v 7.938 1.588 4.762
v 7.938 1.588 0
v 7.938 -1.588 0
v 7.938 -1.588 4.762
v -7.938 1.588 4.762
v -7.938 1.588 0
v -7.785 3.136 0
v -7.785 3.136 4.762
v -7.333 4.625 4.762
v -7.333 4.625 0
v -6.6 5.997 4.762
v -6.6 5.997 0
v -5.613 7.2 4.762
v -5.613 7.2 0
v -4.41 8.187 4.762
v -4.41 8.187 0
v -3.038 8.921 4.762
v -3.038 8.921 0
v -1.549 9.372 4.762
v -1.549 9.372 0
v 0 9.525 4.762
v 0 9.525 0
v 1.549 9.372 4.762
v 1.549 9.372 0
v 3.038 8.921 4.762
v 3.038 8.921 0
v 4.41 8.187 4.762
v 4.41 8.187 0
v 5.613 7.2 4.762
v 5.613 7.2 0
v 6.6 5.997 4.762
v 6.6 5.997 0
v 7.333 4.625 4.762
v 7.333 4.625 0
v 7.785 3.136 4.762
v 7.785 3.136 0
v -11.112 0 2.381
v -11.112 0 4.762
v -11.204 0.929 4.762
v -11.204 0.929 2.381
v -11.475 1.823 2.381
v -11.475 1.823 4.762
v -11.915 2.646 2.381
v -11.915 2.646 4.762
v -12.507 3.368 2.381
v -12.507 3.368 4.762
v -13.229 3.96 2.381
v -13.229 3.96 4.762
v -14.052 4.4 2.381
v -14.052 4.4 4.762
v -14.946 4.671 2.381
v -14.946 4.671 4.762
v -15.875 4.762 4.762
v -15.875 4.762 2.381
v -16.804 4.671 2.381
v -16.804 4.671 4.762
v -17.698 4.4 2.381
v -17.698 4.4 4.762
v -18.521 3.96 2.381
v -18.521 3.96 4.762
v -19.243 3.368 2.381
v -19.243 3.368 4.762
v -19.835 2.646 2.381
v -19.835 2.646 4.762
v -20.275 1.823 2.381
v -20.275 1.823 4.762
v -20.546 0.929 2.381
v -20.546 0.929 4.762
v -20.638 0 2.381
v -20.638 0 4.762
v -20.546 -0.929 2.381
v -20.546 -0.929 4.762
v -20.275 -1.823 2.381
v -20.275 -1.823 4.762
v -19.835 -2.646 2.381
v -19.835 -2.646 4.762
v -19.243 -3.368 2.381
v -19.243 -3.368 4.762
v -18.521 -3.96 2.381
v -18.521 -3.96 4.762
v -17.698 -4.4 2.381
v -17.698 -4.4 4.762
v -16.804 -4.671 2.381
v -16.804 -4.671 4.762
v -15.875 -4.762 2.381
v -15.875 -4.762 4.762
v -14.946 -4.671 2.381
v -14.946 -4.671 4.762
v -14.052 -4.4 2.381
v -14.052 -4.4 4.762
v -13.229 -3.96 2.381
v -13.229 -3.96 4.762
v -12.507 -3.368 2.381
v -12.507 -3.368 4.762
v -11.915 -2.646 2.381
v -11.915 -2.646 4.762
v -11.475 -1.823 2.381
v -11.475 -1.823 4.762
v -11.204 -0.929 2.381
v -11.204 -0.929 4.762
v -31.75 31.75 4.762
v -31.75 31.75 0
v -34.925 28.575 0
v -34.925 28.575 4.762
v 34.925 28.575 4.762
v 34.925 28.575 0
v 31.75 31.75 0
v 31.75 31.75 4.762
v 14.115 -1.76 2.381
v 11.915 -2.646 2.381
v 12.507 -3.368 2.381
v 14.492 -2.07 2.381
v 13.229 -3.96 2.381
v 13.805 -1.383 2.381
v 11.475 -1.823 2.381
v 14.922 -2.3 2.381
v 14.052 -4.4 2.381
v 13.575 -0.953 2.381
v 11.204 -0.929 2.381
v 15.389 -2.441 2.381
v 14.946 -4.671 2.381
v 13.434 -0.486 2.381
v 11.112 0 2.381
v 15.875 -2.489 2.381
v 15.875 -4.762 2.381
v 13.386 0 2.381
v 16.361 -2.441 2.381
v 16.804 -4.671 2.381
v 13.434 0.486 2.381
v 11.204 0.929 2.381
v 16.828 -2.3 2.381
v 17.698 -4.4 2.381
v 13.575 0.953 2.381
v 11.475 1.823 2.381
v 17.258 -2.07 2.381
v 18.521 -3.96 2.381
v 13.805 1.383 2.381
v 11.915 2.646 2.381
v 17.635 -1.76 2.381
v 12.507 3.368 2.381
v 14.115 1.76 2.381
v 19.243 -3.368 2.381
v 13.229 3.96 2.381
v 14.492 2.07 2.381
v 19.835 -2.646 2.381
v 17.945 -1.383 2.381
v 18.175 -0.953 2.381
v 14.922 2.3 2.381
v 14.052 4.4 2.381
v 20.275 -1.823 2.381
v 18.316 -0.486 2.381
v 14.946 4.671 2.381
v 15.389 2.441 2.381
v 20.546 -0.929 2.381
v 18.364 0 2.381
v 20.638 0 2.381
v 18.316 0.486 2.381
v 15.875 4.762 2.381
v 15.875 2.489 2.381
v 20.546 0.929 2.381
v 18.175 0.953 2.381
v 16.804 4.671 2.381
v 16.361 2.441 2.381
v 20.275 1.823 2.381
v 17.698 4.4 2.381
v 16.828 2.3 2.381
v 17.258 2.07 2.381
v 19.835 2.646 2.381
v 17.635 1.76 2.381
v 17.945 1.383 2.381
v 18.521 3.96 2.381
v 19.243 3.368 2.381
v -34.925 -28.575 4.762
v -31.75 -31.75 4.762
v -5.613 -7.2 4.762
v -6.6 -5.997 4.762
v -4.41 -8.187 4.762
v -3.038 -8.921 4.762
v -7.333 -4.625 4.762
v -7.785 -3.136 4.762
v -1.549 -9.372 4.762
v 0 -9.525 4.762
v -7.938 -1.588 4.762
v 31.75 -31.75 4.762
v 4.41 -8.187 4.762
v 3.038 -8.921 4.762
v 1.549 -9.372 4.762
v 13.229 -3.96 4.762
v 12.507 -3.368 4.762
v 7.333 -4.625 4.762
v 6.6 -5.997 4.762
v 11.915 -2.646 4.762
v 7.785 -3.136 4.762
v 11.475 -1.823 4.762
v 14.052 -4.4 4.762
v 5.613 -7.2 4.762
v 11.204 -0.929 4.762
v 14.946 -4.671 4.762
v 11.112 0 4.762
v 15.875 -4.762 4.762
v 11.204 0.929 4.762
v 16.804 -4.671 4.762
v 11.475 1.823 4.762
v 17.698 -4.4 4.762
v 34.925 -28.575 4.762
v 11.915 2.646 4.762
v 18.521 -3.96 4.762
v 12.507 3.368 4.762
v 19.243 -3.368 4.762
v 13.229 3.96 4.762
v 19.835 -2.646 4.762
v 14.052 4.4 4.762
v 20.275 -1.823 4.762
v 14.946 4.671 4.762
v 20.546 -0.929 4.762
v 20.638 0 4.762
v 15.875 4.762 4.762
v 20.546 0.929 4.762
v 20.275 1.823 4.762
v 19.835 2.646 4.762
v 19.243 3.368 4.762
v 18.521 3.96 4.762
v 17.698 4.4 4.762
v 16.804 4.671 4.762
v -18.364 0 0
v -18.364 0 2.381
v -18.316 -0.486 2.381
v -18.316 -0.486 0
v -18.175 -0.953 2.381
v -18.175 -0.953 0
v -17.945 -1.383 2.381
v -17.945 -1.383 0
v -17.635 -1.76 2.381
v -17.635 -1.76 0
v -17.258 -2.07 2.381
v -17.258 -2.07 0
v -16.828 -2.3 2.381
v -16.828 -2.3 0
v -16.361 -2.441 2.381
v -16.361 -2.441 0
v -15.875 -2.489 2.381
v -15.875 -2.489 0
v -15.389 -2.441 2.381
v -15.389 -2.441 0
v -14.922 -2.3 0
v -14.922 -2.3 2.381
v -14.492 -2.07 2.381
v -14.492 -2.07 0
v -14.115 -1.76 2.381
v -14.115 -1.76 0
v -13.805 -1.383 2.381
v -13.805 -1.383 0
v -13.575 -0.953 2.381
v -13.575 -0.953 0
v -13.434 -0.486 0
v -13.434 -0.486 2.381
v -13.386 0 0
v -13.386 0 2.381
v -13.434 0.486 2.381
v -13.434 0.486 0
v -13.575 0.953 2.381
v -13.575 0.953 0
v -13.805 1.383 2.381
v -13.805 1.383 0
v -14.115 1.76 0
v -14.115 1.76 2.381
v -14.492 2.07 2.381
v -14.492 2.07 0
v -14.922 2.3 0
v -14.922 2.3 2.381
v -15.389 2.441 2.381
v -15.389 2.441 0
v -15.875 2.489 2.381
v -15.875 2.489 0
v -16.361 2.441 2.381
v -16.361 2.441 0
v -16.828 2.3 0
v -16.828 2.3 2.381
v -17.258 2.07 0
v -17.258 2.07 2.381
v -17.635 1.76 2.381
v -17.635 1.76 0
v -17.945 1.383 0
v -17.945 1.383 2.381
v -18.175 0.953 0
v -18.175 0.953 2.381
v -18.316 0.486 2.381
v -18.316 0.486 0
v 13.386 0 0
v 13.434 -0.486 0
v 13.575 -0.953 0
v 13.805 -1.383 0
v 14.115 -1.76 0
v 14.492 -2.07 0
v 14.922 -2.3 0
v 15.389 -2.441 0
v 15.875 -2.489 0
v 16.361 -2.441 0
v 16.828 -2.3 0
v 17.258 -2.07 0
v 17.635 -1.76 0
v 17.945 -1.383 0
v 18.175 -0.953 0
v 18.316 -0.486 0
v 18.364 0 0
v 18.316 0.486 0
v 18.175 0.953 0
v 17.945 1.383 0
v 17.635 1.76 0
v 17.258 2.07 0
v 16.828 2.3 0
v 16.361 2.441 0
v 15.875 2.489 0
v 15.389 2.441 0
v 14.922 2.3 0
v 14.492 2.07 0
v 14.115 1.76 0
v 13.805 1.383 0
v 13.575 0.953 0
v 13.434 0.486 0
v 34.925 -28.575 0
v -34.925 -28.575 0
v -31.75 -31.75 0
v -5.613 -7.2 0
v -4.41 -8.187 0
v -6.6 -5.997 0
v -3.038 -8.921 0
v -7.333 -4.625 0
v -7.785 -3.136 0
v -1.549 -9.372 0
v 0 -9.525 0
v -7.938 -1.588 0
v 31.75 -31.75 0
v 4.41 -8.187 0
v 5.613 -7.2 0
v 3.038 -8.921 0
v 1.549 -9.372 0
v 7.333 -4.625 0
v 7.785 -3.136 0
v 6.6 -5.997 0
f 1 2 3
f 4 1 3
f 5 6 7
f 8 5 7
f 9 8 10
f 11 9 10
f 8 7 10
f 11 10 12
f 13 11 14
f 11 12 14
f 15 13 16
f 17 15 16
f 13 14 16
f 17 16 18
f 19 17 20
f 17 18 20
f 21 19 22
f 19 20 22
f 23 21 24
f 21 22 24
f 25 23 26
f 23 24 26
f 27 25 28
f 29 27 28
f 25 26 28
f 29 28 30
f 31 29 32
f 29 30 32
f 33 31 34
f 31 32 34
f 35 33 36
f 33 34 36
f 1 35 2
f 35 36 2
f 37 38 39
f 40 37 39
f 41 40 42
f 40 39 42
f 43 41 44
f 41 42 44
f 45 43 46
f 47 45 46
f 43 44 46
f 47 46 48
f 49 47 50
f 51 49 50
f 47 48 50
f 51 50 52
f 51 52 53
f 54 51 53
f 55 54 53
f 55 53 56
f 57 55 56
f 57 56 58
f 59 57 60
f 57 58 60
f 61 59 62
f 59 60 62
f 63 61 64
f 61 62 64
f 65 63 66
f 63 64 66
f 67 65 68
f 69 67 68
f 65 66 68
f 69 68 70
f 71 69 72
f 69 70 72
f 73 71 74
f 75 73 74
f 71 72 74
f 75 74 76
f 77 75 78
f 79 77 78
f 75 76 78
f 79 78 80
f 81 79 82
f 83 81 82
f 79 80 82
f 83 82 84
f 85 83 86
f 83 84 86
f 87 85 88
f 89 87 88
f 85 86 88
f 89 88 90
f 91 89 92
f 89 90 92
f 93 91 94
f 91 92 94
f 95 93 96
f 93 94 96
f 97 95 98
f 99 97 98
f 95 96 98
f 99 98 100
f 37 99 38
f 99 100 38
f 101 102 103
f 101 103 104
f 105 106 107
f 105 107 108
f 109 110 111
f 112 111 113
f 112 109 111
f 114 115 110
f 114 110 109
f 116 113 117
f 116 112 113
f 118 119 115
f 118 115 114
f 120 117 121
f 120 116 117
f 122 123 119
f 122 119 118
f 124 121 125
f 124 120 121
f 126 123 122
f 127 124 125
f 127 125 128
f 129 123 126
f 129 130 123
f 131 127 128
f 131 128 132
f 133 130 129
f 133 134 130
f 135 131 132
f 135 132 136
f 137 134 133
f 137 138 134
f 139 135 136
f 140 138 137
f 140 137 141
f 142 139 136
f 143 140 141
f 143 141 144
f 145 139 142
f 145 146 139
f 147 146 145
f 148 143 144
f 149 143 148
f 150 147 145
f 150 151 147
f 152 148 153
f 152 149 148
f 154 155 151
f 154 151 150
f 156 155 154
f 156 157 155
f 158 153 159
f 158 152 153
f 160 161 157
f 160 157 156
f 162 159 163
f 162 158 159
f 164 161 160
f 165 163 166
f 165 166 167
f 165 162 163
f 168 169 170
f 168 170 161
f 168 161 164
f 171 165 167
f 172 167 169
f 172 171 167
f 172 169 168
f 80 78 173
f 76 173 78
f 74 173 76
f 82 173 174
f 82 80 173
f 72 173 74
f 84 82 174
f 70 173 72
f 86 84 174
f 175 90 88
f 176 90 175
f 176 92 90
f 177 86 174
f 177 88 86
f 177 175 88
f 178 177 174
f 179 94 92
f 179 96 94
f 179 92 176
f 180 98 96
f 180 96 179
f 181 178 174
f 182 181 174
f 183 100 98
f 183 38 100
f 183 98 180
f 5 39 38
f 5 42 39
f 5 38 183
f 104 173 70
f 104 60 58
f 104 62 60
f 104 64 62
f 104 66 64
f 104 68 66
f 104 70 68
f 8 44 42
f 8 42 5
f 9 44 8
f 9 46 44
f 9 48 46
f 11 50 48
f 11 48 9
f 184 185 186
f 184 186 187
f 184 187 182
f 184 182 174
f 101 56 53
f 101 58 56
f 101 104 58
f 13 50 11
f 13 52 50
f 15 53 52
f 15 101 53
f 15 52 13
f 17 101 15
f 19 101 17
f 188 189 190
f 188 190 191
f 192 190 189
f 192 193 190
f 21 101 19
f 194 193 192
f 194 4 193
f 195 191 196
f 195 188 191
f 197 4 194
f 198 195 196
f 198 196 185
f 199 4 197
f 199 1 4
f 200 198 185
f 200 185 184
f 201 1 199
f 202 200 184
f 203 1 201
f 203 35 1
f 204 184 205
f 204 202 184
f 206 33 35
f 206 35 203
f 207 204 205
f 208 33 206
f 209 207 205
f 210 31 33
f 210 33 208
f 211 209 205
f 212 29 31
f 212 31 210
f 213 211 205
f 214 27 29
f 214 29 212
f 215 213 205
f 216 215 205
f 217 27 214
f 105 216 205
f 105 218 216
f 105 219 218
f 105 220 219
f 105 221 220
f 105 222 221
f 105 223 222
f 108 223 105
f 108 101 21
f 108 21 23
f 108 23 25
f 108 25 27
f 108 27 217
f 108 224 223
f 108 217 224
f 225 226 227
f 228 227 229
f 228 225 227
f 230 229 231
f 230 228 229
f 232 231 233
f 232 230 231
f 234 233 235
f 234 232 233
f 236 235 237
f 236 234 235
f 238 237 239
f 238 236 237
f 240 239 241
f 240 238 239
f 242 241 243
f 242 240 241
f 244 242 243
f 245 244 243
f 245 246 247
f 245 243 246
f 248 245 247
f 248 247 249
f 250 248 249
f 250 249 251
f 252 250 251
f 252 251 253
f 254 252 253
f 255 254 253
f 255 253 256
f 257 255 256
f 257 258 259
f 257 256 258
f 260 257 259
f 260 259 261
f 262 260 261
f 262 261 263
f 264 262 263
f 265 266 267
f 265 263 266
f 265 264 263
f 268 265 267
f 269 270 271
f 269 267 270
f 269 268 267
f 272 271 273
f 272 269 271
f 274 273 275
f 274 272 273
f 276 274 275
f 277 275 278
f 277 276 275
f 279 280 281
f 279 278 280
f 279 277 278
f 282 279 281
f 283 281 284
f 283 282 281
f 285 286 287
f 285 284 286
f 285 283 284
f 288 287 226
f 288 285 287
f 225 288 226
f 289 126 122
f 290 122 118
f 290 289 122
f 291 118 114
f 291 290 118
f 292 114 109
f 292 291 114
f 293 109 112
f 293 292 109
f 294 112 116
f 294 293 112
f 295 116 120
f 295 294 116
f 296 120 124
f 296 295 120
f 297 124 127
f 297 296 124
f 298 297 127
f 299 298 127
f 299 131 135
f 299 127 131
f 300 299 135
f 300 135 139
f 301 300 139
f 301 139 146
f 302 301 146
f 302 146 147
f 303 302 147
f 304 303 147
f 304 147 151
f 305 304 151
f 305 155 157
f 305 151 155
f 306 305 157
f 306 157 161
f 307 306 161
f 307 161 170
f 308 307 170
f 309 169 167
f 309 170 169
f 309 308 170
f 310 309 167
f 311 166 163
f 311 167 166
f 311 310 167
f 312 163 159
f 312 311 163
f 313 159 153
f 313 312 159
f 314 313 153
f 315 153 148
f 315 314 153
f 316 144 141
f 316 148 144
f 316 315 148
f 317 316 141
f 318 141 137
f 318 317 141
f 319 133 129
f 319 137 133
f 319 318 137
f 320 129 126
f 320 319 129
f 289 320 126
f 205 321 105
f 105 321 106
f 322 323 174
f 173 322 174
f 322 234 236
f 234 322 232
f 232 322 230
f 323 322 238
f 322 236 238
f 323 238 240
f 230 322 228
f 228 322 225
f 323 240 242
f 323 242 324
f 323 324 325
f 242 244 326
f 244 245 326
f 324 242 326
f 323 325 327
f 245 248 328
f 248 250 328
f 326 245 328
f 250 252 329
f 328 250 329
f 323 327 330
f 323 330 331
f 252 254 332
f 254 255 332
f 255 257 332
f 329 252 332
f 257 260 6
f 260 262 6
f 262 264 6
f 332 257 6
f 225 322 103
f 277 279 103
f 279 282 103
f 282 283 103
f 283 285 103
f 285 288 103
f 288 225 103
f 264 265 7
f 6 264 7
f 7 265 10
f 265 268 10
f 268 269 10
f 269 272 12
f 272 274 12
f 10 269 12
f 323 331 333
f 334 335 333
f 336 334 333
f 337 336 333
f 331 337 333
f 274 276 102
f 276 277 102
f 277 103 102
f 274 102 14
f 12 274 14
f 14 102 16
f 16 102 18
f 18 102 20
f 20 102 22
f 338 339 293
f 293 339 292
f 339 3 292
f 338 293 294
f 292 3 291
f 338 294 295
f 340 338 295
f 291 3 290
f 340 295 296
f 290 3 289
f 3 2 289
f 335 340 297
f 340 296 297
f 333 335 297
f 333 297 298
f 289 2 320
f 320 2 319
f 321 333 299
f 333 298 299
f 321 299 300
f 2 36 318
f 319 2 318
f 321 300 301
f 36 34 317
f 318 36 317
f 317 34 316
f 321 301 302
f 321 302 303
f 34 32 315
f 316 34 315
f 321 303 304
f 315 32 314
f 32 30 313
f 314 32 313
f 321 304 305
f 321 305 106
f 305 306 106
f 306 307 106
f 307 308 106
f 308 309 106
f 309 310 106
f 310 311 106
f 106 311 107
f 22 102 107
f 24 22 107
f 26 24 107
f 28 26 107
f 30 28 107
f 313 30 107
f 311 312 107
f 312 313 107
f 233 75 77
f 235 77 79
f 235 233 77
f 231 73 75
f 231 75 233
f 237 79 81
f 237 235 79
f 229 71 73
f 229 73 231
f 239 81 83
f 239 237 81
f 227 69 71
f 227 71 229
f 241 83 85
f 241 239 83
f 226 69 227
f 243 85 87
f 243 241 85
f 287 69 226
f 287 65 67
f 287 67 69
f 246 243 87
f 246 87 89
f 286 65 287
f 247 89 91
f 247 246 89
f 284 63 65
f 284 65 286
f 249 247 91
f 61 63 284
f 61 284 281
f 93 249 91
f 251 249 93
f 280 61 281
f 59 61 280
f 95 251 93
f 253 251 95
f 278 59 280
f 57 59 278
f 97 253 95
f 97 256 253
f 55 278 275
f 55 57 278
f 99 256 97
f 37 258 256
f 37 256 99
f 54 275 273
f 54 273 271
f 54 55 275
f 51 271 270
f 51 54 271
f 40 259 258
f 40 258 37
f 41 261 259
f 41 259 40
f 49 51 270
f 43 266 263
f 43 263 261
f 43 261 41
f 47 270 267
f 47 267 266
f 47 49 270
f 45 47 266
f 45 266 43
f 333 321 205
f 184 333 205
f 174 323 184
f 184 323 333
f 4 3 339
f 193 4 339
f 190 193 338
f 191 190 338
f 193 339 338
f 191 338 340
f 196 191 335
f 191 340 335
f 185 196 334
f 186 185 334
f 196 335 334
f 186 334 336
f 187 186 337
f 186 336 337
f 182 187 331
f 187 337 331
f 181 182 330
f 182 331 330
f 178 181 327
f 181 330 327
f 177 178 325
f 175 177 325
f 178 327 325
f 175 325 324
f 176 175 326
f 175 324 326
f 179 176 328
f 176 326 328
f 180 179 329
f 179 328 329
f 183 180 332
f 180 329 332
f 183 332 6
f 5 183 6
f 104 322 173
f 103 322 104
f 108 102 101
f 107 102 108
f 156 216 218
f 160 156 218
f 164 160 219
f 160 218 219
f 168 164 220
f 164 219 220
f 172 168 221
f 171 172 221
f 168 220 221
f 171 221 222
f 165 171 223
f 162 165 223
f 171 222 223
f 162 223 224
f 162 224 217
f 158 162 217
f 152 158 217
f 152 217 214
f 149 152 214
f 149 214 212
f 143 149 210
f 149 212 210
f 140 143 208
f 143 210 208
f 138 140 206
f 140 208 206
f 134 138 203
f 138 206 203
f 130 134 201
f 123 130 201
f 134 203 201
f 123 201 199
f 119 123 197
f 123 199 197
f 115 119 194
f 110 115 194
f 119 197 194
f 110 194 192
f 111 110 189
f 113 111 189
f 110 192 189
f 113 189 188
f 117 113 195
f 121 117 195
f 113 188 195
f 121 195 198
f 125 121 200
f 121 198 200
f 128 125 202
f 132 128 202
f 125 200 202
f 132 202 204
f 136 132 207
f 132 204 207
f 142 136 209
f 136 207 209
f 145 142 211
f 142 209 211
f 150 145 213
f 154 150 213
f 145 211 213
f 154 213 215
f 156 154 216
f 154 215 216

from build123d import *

# Parameters (mm, degrees)
SKETCH1_W           = 69.85
SKETCH1_H           = 63.5
SKETCH1_R           = 2.4892
BOSS_EXTRUDE1_DEPTH = 4.7625
CHAMFER1_SIZE       = 3.175
SKETCH2_R           = 4.7625
CUT_EXTRUDE1_DEPTH  = 2.38125


with BuildPart() as part:
    # Sketch1 → Boss-Extrude1 (new body)
    with BuildSketch(Plane.XY):
        Rectangle(SKETCH1_W, SKETCH1_H)
        with Locations(Location((-15.875, 0, 0), (0, 0, 180))):
            Circle(SKETCH1_R, mode=Mode.SUBTRACT)
        with Locations(Location((15.875, 0, 0), (0, 0, 180))):
            Circle(SKETCH1_R, mode=Mode.SUBTRACT)
        with BuildLine():
            Line((7.9375, 1.5875), (7.9375, -1.5875))
            ThreePointArc((7.9375, -1.5875), (0, -9.525), (-7.9375, -1.5875))
            Line((-7.9375, -1.5875), (-7.9375, 1.5875))
            ThreePointArc((-7.9375, 1.5875), (0, 9.525), (7.9375, 1.5875))
        make_face(mode=Mode.SUBTRACT)
    extrude(amount=BOSS_EXTRUDE1_DEPTH)

    # Chamfer1
    chamfer1_edges = [part.edges().sort_by_distance(p)[0] for p in [
        (34.925, -31.75, 2.38125),
        (-34.925, -31.75, 2.38125),
        (-34.925, 31.75, 2.38125),
        (34.925, 31.75, 2.38125),
    ]]
    chamfer(chamfer1_edges, length=CHAMFER1_SIZE)

    # Sketch2 → Cut-Extrude1 (cut)
    with BuildSketch(Plane.XY.offset(4.7625)):
        with Locations((-15.875, 0)):
            Circle(SKETCH2_R)
        with Locations((15.875, 0)):
            Circle(SKETCH2_R)
    extrude(amount=-CUT_EXTRUDE1_DEPTH, mode=Mode.SUBTRACT)


solid = part.part
